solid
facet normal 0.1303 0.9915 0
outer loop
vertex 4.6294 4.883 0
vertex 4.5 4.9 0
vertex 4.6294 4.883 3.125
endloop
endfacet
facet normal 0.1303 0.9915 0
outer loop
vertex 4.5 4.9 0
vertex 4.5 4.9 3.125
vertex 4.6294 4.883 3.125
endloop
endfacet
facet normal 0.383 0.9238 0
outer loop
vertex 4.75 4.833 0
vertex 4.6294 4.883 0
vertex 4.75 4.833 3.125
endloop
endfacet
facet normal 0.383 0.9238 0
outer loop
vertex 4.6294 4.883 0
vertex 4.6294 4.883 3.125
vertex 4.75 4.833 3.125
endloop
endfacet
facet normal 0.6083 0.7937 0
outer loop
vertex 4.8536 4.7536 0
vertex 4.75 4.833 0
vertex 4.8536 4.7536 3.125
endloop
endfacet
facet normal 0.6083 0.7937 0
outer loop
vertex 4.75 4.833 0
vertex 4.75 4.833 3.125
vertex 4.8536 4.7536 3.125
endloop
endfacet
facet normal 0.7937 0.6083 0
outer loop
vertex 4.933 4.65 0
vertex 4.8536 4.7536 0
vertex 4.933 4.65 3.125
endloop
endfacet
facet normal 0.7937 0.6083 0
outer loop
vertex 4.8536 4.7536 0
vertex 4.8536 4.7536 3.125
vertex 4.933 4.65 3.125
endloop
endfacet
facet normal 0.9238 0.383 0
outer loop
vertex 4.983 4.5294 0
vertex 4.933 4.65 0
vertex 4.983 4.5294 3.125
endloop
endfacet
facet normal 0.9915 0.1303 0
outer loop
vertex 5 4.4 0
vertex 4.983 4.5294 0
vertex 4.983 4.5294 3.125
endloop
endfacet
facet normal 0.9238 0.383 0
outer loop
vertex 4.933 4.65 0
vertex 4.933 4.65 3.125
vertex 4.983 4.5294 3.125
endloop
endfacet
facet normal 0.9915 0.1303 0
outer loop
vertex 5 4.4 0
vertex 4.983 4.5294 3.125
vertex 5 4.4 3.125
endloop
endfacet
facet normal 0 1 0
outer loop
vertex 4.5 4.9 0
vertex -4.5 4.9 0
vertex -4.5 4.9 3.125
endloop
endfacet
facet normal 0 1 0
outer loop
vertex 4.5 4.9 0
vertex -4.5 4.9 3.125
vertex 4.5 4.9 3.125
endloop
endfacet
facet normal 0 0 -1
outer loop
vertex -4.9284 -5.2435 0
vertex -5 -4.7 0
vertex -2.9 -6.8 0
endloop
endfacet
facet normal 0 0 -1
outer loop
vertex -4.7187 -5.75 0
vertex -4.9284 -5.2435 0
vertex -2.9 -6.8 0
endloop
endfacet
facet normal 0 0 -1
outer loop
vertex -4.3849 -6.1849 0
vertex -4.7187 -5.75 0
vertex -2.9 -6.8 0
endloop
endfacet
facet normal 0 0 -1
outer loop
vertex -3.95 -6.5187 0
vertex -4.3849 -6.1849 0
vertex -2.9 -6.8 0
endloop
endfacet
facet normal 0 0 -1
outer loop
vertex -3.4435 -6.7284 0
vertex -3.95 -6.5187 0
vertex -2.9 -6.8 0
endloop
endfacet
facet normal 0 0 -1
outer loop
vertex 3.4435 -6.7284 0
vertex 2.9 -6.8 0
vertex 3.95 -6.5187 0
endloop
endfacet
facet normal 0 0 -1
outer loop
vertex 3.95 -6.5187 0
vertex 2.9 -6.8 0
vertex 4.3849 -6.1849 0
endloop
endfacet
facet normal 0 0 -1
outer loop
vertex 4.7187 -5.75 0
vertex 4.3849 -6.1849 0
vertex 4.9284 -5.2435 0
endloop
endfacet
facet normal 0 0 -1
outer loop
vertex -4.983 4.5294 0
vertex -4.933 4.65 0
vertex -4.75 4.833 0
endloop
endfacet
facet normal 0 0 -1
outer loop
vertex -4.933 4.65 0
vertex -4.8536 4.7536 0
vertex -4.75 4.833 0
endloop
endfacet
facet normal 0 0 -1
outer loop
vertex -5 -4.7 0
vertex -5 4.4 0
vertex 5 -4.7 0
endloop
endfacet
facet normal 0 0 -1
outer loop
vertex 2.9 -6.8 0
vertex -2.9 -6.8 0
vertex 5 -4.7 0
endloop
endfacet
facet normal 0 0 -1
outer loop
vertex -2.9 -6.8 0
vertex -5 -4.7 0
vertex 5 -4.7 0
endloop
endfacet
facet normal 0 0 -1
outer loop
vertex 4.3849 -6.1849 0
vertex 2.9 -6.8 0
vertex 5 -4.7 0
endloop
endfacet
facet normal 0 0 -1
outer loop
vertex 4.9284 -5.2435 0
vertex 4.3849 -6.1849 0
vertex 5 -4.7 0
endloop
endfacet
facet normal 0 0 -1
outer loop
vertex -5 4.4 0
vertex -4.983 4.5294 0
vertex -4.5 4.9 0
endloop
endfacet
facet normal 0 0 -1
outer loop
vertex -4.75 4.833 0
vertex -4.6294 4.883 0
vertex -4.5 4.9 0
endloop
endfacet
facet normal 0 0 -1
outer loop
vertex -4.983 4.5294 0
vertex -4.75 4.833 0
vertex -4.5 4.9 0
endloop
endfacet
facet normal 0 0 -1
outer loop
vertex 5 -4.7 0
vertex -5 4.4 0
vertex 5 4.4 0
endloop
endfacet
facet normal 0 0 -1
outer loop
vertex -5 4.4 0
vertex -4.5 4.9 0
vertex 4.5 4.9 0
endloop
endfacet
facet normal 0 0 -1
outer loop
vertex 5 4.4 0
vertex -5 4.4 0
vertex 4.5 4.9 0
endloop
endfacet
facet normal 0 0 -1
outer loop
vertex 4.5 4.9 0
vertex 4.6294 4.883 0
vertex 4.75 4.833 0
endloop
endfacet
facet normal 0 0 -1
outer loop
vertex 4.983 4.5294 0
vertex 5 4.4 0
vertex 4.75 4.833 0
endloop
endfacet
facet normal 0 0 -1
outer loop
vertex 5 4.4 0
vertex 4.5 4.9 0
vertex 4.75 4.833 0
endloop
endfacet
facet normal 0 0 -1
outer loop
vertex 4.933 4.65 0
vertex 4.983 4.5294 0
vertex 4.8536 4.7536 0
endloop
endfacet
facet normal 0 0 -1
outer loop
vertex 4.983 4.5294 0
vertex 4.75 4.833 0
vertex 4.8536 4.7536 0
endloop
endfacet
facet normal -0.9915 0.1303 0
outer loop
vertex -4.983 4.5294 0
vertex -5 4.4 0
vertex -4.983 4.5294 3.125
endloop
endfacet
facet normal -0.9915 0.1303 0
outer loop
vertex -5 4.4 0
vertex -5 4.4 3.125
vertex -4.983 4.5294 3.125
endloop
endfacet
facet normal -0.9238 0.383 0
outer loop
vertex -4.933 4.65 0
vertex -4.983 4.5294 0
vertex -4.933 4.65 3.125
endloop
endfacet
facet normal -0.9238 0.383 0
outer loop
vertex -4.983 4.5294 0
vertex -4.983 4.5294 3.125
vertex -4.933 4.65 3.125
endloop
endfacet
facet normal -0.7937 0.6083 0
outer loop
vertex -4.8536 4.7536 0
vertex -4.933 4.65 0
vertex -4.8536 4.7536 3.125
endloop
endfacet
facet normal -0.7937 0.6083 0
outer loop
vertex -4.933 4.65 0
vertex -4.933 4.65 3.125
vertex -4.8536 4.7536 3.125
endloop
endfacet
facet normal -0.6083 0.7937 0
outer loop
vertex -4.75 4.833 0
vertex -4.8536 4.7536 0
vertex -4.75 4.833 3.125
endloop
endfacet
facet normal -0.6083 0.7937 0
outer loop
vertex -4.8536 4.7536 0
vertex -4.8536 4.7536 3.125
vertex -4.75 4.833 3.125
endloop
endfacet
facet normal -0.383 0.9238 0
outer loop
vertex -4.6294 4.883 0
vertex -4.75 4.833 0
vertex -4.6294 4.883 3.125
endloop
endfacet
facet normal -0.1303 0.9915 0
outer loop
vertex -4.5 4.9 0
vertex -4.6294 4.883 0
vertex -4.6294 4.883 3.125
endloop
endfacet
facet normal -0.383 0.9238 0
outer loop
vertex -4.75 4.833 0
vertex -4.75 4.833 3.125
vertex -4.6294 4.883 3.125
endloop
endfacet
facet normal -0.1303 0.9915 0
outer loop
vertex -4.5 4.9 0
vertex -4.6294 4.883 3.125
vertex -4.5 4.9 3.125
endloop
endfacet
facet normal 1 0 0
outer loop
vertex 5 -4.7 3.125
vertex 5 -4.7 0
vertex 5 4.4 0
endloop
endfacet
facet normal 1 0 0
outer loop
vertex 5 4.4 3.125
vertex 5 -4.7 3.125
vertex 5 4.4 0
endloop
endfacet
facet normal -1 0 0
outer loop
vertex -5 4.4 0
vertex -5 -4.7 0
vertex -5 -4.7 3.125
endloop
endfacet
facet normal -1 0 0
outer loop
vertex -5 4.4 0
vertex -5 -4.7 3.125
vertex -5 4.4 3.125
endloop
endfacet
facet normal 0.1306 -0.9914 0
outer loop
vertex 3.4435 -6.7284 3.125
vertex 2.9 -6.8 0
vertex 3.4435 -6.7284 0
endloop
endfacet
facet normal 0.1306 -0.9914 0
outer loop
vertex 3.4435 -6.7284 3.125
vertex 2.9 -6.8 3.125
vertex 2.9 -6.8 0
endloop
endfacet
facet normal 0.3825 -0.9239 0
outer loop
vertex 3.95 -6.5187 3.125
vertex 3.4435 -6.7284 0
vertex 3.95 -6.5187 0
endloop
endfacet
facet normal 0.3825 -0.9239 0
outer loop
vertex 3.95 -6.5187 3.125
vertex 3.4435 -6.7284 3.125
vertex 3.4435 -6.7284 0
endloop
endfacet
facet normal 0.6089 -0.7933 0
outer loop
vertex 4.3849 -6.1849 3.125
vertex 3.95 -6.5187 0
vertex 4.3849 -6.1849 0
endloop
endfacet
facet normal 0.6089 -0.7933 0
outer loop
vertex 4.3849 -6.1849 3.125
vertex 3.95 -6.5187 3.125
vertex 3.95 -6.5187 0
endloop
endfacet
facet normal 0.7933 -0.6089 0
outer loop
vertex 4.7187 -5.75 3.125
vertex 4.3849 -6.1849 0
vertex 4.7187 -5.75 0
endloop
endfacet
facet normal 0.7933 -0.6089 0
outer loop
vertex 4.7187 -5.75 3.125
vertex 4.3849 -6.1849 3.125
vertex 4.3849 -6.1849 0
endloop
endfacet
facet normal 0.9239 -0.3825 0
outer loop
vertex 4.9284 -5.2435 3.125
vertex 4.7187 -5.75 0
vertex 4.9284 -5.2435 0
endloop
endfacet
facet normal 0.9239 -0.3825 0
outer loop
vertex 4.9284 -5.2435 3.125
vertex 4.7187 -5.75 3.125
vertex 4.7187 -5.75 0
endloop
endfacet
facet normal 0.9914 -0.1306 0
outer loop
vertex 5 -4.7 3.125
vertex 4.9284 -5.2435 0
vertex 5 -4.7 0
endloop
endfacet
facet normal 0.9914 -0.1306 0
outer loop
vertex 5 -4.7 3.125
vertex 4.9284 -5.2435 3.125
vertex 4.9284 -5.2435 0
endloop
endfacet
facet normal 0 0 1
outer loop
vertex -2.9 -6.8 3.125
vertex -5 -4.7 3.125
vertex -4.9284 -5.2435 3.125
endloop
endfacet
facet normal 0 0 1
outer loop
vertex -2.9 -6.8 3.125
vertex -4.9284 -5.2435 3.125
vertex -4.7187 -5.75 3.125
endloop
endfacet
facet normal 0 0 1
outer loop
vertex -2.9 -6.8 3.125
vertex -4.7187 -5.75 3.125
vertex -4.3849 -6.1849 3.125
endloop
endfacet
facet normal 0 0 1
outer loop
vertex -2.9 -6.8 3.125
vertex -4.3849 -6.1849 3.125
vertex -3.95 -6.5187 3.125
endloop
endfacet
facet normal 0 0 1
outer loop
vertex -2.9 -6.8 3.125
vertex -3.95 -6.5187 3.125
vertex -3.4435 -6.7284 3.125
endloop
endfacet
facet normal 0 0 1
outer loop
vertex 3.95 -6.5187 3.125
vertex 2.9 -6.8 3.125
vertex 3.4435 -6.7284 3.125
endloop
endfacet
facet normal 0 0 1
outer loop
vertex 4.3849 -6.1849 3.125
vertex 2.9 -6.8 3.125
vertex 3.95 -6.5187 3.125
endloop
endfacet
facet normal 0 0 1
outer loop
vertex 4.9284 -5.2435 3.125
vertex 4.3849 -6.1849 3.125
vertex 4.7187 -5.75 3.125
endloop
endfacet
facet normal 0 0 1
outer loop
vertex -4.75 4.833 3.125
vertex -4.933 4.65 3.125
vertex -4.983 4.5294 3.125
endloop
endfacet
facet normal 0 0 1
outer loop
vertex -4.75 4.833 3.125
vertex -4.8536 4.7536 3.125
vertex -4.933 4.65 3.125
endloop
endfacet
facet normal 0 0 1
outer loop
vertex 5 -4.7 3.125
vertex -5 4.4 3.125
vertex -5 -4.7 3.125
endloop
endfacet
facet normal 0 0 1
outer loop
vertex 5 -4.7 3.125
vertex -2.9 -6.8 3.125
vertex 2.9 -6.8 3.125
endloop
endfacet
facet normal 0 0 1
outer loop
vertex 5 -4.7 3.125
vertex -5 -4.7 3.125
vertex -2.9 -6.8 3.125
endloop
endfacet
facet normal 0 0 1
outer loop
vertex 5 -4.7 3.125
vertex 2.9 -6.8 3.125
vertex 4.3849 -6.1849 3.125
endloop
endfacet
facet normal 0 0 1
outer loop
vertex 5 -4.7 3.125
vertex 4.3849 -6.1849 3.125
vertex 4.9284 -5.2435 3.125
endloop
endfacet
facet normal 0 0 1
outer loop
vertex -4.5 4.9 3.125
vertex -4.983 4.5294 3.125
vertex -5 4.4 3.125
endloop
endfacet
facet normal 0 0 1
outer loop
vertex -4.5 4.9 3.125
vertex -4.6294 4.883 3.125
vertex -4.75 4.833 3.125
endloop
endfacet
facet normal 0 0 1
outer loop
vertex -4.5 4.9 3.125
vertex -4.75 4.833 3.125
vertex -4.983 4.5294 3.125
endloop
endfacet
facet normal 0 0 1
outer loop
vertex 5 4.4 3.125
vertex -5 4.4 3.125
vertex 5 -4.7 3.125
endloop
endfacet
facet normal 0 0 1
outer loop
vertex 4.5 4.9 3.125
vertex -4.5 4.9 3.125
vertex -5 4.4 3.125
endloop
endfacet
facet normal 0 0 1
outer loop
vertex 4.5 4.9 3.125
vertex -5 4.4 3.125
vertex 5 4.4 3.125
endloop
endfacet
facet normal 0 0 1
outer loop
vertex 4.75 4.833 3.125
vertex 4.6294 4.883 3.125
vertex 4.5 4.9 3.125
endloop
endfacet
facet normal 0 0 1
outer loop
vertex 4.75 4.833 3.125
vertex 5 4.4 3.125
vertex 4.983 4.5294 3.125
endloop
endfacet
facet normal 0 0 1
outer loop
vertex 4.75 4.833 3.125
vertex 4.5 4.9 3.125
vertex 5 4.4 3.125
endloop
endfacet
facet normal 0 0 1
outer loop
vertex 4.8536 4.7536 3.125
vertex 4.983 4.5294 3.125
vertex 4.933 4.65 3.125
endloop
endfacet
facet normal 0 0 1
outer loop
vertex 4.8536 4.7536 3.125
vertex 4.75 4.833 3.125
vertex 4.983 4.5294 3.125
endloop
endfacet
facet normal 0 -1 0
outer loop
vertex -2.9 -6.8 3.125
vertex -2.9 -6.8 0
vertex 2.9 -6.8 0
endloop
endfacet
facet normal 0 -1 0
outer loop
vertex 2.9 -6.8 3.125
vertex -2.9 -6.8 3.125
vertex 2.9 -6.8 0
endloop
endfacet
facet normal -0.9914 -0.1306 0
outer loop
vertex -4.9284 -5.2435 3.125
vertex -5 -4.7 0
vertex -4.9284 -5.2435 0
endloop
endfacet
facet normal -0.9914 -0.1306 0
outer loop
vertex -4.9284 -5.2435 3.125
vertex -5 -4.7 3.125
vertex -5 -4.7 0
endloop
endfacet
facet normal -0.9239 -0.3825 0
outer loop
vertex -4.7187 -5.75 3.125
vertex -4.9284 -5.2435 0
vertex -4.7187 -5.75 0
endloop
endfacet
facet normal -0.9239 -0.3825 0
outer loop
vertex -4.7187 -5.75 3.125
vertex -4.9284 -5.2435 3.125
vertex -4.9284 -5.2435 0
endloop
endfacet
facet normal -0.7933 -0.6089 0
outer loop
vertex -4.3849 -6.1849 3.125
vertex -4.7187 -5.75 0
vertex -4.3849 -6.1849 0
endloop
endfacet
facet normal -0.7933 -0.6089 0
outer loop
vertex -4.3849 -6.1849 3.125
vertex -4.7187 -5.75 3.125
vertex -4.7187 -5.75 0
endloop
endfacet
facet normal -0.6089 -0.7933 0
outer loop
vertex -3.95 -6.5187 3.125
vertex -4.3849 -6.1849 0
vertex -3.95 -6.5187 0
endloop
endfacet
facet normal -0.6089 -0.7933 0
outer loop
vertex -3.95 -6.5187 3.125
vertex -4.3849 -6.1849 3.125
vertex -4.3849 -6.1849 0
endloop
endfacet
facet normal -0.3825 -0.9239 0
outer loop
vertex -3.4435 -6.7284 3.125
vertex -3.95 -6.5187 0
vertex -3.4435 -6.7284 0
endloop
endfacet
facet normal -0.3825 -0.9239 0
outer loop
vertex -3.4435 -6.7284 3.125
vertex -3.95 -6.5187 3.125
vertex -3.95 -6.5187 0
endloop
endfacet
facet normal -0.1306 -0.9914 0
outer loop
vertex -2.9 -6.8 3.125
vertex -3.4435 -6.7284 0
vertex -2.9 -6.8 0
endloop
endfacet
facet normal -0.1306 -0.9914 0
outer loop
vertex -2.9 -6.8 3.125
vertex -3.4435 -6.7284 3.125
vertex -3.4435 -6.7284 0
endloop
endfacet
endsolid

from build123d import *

# Parameters (mm, degrees)
SKETCH1_W           = 10
SKETCH1_H           = 11.7
BOSS_EXTRUDE1_DEPTH = 3.125
FILLET1_R           = 2.1
FILLET2_R           = 0.5


with BuildPart() as part:
    # Sketch1 → Boss-Extrude1 (new body)
    with BuildSketch(Plane.XY):
        with Locations((0, -0.95)):
            Rectangle(SKETCH1_W, SKETCH1_H)
    extrude(amount=BOSS_EXTRUDE1_DEPTH)

    # Fillet1
    fillet1_edges = [part.edges().sort_by_distance(p)[0] for p in [
        (5, -6.8, 1.5625),
        (-5, -6.8, 1.5625),
    ]]
    fillet(fillet1_edges, radius=FILLET1_R)

    # Fillet2
    fillet2_edges = [part.edges().sort_by_distance(p)[0] for p in [
        (-5, 4.9, 1.5625),
        (5, 4.9, 1.5625),
    ]]
    fillet(fillet2_edges, radius=FILLET2_R)


solid = part.part
